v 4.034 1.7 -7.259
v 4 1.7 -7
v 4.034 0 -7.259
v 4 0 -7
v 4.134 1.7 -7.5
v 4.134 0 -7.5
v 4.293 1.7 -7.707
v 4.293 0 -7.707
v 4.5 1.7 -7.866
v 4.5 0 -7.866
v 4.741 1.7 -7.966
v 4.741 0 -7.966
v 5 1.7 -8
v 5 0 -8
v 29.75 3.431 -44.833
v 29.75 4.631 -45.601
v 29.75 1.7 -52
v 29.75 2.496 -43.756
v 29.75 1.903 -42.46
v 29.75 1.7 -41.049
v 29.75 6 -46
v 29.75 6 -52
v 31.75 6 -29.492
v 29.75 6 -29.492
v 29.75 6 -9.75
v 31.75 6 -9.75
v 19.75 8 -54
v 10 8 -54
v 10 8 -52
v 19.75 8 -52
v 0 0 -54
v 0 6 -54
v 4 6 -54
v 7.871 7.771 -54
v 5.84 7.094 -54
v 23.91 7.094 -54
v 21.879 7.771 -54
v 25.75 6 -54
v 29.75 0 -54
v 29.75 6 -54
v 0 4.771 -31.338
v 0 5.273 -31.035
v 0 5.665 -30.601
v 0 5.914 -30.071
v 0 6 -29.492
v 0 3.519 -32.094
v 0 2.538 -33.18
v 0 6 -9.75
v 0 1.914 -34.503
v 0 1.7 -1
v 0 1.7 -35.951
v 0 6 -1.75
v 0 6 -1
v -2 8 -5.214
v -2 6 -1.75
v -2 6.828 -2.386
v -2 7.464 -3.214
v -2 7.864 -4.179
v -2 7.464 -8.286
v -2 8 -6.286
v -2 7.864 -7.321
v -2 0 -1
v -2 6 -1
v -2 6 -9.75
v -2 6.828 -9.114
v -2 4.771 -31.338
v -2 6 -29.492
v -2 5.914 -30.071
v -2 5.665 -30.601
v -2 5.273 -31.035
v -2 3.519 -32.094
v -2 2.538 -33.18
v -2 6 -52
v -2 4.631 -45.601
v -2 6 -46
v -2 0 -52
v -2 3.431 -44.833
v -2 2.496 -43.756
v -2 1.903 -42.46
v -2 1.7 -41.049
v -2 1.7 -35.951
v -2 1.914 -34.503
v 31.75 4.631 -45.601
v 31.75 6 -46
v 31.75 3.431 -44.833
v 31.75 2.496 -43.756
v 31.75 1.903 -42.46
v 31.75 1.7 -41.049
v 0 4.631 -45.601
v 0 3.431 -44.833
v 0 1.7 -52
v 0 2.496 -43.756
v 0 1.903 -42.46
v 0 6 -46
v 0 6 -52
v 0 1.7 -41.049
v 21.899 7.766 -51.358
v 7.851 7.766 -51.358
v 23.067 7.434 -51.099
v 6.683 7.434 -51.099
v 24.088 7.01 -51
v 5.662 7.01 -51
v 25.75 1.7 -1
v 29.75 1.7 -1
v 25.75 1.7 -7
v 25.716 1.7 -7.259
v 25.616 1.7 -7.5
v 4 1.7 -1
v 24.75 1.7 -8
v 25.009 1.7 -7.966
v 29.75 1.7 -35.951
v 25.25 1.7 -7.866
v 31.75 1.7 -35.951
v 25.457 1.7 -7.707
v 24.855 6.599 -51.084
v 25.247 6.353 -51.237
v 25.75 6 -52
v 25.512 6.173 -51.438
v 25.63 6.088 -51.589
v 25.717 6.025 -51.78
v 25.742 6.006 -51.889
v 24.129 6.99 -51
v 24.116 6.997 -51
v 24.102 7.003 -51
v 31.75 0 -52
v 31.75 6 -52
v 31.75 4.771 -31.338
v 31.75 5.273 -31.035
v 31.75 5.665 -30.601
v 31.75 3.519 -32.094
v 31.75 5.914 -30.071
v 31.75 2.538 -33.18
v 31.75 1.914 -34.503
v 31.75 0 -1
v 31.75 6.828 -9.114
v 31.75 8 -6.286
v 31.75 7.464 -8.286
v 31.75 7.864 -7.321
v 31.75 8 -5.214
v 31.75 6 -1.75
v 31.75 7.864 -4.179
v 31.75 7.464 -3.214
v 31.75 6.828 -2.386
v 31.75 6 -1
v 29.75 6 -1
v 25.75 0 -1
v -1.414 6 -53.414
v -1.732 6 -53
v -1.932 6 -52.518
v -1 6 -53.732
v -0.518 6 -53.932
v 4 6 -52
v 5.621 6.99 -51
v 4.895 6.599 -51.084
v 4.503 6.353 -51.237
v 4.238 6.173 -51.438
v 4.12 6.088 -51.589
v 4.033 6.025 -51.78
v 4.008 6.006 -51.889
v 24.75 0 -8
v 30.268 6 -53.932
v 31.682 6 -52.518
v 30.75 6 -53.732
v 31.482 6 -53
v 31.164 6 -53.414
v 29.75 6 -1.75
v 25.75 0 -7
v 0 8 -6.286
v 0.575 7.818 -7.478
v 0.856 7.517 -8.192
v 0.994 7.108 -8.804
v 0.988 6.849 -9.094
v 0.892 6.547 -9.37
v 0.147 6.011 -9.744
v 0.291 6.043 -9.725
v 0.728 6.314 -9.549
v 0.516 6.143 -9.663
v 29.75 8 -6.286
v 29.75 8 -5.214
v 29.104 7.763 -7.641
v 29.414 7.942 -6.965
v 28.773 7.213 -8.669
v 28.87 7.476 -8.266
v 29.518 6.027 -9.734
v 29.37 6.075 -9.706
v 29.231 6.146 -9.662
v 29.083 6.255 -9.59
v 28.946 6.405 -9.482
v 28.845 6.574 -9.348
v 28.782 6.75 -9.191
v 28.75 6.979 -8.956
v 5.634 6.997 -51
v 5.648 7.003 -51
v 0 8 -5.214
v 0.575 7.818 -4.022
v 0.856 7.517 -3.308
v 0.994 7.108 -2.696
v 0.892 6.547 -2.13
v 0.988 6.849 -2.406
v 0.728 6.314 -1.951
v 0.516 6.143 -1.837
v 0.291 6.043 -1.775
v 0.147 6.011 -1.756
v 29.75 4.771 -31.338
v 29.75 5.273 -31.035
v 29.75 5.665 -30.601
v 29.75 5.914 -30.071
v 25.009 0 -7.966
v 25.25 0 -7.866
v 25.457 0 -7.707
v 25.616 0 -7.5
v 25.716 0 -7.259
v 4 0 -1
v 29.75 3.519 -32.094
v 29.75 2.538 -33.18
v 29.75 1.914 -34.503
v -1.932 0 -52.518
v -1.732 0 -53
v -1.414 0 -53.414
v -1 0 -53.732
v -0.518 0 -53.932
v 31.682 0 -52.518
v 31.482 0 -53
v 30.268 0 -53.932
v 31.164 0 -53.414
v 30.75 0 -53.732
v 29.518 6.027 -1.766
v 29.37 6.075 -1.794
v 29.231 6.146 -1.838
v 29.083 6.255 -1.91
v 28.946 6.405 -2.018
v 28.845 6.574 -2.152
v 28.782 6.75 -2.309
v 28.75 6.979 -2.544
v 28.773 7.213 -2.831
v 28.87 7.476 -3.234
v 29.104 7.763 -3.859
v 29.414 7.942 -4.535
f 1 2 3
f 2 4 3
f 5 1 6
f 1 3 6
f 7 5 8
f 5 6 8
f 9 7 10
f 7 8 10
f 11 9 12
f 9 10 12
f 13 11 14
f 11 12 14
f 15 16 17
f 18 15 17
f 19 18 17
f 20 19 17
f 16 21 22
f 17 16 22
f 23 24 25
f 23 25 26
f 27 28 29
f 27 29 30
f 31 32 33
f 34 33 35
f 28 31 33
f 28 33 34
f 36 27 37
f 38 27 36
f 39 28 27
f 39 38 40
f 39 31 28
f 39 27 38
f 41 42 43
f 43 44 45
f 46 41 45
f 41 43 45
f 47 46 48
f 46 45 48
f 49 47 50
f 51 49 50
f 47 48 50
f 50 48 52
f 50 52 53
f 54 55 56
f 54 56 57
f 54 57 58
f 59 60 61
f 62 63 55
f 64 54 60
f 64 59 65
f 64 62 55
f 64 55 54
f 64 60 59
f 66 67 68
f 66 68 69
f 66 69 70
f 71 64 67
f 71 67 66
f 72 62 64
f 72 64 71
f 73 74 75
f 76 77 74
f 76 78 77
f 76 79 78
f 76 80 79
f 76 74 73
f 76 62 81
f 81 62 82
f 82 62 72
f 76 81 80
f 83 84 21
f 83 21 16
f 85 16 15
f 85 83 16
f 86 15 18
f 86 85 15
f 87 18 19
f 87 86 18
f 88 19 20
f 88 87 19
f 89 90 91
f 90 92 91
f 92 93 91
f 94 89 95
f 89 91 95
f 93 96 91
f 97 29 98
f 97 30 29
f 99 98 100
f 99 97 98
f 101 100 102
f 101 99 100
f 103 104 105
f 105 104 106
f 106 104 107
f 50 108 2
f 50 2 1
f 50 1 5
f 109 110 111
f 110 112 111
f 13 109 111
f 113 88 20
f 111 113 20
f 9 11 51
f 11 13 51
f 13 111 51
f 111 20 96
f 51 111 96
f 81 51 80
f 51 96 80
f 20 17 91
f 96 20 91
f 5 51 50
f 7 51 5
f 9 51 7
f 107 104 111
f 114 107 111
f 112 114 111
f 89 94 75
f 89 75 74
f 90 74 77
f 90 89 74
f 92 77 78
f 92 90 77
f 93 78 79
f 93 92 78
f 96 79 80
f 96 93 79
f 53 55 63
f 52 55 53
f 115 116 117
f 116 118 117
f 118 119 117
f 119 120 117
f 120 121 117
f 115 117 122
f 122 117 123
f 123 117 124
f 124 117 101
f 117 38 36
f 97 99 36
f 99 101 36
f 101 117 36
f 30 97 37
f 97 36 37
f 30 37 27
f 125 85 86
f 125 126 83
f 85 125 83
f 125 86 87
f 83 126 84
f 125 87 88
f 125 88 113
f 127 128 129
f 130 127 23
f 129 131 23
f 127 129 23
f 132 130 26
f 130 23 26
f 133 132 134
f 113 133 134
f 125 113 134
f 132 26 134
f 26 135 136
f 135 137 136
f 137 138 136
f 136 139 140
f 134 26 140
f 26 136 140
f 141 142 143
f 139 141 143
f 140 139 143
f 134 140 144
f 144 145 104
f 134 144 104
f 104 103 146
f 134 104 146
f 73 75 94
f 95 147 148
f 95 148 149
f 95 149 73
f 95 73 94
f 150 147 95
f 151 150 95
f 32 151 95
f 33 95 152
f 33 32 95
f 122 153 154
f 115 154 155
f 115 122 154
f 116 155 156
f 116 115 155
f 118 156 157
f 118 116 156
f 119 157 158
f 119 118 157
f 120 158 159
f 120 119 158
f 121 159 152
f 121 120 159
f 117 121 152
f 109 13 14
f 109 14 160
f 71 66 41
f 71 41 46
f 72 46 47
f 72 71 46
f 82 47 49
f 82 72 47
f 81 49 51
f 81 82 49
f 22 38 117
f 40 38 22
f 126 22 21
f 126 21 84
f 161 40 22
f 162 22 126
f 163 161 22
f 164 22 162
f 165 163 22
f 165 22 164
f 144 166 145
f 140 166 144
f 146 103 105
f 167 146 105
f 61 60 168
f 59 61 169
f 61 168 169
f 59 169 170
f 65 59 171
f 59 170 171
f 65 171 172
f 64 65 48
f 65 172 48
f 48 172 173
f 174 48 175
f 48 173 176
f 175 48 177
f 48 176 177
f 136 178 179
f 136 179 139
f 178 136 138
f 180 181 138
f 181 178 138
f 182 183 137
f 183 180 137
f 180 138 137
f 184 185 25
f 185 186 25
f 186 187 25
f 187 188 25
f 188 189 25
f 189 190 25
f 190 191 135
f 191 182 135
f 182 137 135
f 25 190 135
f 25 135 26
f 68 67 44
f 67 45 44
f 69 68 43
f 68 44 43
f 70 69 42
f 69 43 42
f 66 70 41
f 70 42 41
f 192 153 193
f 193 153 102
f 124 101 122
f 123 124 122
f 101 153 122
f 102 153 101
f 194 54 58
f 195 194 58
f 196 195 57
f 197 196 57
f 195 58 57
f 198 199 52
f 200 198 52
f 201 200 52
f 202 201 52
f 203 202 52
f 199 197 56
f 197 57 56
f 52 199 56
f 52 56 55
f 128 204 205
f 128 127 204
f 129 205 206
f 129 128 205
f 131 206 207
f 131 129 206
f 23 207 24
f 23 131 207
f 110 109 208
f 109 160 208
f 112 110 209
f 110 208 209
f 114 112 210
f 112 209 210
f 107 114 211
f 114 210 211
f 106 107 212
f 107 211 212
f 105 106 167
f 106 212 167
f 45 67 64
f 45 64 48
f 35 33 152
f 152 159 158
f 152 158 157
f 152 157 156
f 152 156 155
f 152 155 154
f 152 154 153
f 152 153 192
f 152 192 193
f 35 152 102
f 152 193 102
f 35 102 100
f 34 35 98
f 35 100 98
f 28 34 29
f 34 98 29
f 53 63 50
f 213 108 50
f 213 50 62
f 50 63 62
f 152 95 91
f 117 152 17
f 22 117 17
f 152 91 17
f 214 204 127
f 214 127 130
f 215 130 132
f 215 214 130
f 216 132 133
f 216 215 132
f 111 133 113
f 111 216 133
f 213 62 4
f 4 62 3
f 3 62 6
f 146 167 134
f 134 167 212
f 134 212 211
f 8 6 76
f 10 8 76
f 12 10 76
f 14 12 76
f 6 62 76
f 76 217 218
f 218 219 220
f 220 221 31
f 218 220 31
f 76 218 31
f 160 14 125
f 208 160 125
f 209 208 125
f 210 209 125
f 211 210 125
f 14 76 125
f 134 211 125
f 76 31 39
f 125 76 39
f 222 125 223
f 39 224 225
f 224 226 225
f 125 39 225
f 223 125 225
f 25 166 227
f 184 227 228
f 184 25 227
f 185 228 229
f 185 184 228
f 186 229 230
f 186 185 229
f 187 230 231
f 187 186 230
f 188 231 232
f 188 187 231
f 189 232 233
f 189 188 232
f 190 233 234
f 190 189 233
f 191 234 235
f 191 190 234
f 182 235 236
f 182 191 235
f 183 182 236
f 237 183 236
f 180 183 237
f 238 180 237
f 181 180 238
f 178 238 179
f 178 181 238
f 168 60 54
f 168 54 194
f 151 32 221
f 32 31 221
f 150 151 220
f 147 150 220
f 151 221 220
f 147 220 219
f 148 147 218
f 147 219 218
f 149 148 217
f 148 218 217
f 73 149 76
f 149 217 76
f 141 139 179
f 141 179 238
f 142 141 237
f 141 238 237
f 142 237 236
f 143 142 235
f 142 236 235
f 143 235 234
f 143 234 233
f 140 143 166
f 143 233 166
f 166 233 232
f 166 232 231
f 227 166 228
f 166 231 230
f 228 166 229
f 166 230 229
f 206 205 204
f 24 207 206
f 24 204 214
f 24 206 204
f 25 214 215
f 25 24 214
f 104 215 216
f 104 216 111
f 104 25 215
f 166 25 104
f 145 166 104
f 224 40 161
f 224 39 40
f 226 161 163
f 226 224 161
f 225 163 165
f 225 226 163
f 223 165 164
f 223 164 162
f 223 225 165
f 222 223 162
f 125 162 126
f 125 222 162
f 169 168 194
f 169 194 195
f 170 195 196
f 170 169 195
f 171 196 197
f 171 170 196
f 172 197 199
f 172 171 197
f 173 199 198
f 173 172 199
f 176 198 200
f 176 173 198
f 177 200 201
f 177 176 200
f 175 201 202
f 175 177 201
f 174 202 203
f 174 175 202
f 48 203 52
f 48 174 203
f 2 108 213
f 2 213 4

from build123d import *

# Parameters (mm, degrees)
SKETCH1_W               = 33.75000000000001
SKETCH1_H               = 55.99999999999999
SKETCH1_W_2             = 29.750000000000004
SKETCH1_H_2             = 52.00000000000001
BOSS_EXTRUDE1_DEPTH     = 6
BOSS_EXTRUDE2_DEPTH     = 1.7
SKETCH3_W               = 29.750000000000004
SKETCH3_H               = 4.3
CUT_EXTRUDE1_DEPTH      = 63.92902748334825
SKETCH5_W               = 21.750000000000004
SKETCH5_H               = 2.999999999999986
SKETCH5_W_2             = 2.9999999999999996
SKETCH5_H_2             = 8
BOSS_EXTRUDE3_DEPTH     = 2
CUT_EXTRUDE2_DEPTH      = 62.66137364671663
CUT_EXTRUDE2_DEPTH_BACK = 62.66137364671663
CUT_EXTRUDE3_DEPTH      = 62.66137364671663
CUT_EXTRUDE3_DEPTH_BACK = 62.66137364671663
CUT_EXTRUDE4_START      = -21.75
CUT_EXTRUDE4_DEPTH      = 21.75
FILLET1_R               = 10
FILLET2_R               = 4
CUT_EXTRUDE5_DEPTH      = 65.17992314238798
SKETCH12_W              = 21.750000000000004
SKETCH12_H              = 6.999999999999999
CUT_EXTRUDE6_DEPTH      = 63.958339642557306
FILLET4_R               = 2
FILLET5_R               = 1
CUT_EXTRUDE7_DEPTH      = 64.15110873264877
CUT_EXTRUDE7_DEPTH_BACK = 64.15110873264877
SKETCH13_W              = 14.999999999999996
SKETCH13_H              = 4.300000000000001
FILLET6_R               = 5
FILLET7_R               = 2


# Read off the part's stored shape, not the designer's step: Cut-Extrude4
with BuildPart() as part:
    # Sketch1 → Boss-Extrude1 (new body)
    with BuildSketch(Plane(origin=(0, 0, 0), x_dir=(1, 0, 0), z_dir=(0, 1, 0))):
        with Locations((14.875000000000002, 25.999999999999996)):
            Rectangle(SKETCH1_W, SKETCH1_H)
        with Locations((14.875000000000002, 26.000000000000004)):
            Rectangle(SKETCH1_W_2, SKETCH1_H_2, mode=Mode.SUBTRACT)
    extrude(amount=BOSS_EXTRUDE1_DEPTH)

    # Sketch2 → Boss-Extrude2 (add)
    with BuildSketch(Plane.XZ):
        Polygon((-1.9999999999999996, 2), (31.749999999999993, 2), (31.75, -53.99999999999999), (-1.9999999999999927, -53.99999999999999), align=None)
    extrude(amount=-BOSS_EXTRUDE2_DEPTH)

    # Sketch3 → Cut-Extrude1 (cut, through all)
    with BuildSketch(Plane(origin=(0, 0, 0), x_dir=(-1, 0, 0), z_dir=(0, 0, -1))):
        with Locations((-14.875000000000002, 3.85)):
            Rectangle(SKETCH3_W, SKETCH3_H)
    extrude(amount=-CUT_EXTRUDE1_DEPTH, mode=Mode.SUBTRACT)

    # Sketch5 → Boss-Extrude3 (add)
    with BuildSketch(Plane(origin=(0, 6, 0), x_dir=(1, 0, 0), z_dir=(0, 1, 0))):
        with Locations((14.875000000000002, 52.5)):
            Rectangle(SKETCH5_W, SKETCH5_H)
        with Locations((-0.4999999999999998, 5.75)):
            Rectangle(SKETCH5_W_2, SKETCH5_H_2)
        Polygon((31.750000000000014, 9.750000000000004), (28.75000000000001, 9.750000000000004), (28.750000000000014, 1.7500000000000033), (31.75000000000002, 1.750000000000004), align=None)
    extrude(amount=BOSS_EXTRUDE3_DEPTH)

    # Sketch6 → Cut-Extrude2 (cut, two sides: drawn at the far end of the back side and taken through both)
    with BuildSketch(Plane.XY.offset(-1.7499999999999998).offset(-CUT_EXTRUDE2_DEPTH_BACK)):
        with BuildLine():
            Line((1, 8), (0, 8))
            ThreePointArc((0, 8), (0.7071067811865474, 7.707106781186548), (1.0000000000000002, 7.000000000000001))
            Line((1, 7.000000000000001), (1, 8))
        make_face()
        with BuildLine():
            Line((1, 6), (1, 7.000000000000001))
            ThreePointArc((1.0000000000000002, 7.000000000000001), (0.7071067811865479, 6.292893218813453), (1.2e-16, 6))
            Line((0, 6), (1, 6))
        make_face()
    extrude(amount=CUT_EXTRUDE2_DEPTH + CUT_EXTRUDE2_DEPTH_BACK, mode=Mode.SUBTRACT)

    # Sketch7 → Cut-Extrude3 (cut, two sides: drawn at the far end of the back side and taken through both)
    with BuildSketch(Plane.XY.offset(-1.749999999999997).offset(-CUT_EXTRUDE3_DEPTH_BACK)):
        with BuildLine():
            Line((28.750000000000014, 6), (29.75, 6))
            ThreePointArc((29.75, 6), (29.042893218813454, 6.292893218813452), (28.75, 7))
            Line((28.750000000000014, 7), (28.750000000000014, 6))
        make_face()
        with BuildLine():
            Line((28.750000000000014, 8), (28.750000000000014, 7))
            ThreePointArc((28.75, 7), (29.042893218813454, 7.707106781186548), (29.75, 8))
            Line((29.75, 8), (28.750000000000014, 8))
        make_face()
    extrude(amount=CUT_EXTRUDE3_DEPTH + CUT_EXTRUDE3_DEPTH_BACK, mode=Mode.SUBTRACT)

    # Cut-Extrude4 outline → Cut-Extrude4 (cut)
    with BuildSketch(Plane.ZY.offset(-4).offset(CUT_EXTRUDE4_START)):
        with BuildLine():
            Line((-51, 6), (-51, 6.99))
            ThreePointArc((-51, 6.99), (-51.296387635, 6.289366479), (-51.99995, 5.999999999))
            Line((-51.99995, 5.999999999), (-51, 6))
        make_face()
        with BuildLine():
            ThreePointArc((-51.99995, 8.000000001), (-51.296387635, 7.710633521), (-51, 7.01))
            Line((-51, 7.01), (-51, 8))
            Line((-51, 8), (-51.99995, 8.000000001))
        make_face()
    extrude(amount=CUT_EXTRUDE4_DEPTH, mode=Mode.SUBTRACT)

    # Fillet1
    # the kernel refuses this fillet: 10 mm, written as the material it takes off along each edge
    with BuildSketch(Plane(origin=(4, 8, -36.99994999999842), x_dir=(1.1324e-13, -1, 0), z_dir=(0, 0, -1))) as fillet1_piece_1:
        with BuildLine():
            CenterArc((10.000000000000679, -5.999999999999498), FILLET1_R, 143.13010235415956, 36.86989764584689)
            Line((6.7946e-13, -6.000000000000631), (-0.19999999999931983, -6.000000000000653))
            Line((-0.19999999999931983, -6.000000000000653), (-0.1999999999999993, -2.265e-14))
            Line((-0.1999999999999993, -2.265e-14), (-2.265e-14, 0.20000000000000018))
            ThreePointArc((-2.265e-14, 0.20000000000000018), (1.0000000000001283, 0.20000000000011342), (1.8400000000002954, 0.11999999999998998))
            Line((1.8400000000002954, 0.11999999999998998), (2.000000000000303, 0))
        make_face()
    extrude(amount=32.00005000000314, mode=Mode.SUBTRACT)
    with BuildSketch(Plane(origin=(25.750000000000004, 8, -69.00000000000158), x_dir=(-1, 0, 0), z_dir=(0, 0, 1))) as fillet1_piece_2:
        with BuildLine():
            CenterArc((6.000000000000632, 10), FILLET1_R, 233.13010235415308, 36.86989764584689)
            Line((2.2737e-13, 2.0000000000003038), (-0.11999999999978073, 1.8400000000003098))
            ThreePointArc((-0.11999999999978073, 1.8400000000003098), (-0.1999999999999993, 1.0000000000001519), (-0.1999999999999993, 0))
            Line((-0.1999999999999993, 0), (0, -0.1999999999999993))
            Line((0, -0.1999999999999993), (6.000000000000632, -0.1999999999999993))
            Line((6.000000000000632, -0.1999999999999993), (6.000000000000632, 0))
        make_face()
    extrude(amount=32.00005000000316, mode=Mode.SUBTRACT)

    # Fillet2
    # the kernel refuses this fillet: 4 mm, written as the material it takes off along each edge
    with BuildSketch(Plane(origin=(8.66025403784487, 8, -9.75), x_dir=(0, -1, 7.283e-14), z_dir=(-1, 0, 0))) as fillet2_piece_1:
        with BuildLine():
            CenterArc((4.000000000000252, 3.4641016151376567), FILLET2_R, 179.99999999999582, 60.000000000001364)
            Line((2.5229e-13, 3.464101615137948), (-0.07999999999974777, 3.464101615137954))
            Line((-0.07999999999974777, 3.464101615137954), (-0.08000000000000007, 5.83e-15))
            Line((-0.08000000000000007, 5.83e-15), (-5.83e-15, -0.08000000000000007))
            ThreePointArc((-5.83e-15, -0.08000000000000007), (1.000000000000036, -0.0800000000000729), (1.9600000000000801, -0.06928203230275251))
            Line((1.9600000000000801, -0.06928203230275251), (2.0000000000000835, 0))
        make_face()
    extrude(amount=19.32050807568974, mode=Mode.SUBTRACT)
    with BuildSketch(Plane(origin=(-10.66025403784487, 8, -1.7499999999999998), x_dir=(0, -1, -7.25e-14), z_dir=(1, 0, 0))) as fillet2_piece_2:
        with BuildLine():
            CenterArc((4.000000000000251, 3.464101615137658), FILLET2_R, 179.99999999999585, 60.000000000001364)
            Line((2.5114e-13, 3.464101615137948), (-0.07999999999974894, 3.464101615137954))
            Line((-0.07999999999974894, 3.464101615137954), (-0.08000000000000007, 5.8e-15))
            Line((-0.08000000000000007, 5.8e-15), (-5.8e-15, -0.08000000000000007))
            ThreePointArc((-5.8e-15, -0.08000000000000007), (1.000000000000036, -0.08000000000007257), (1.9600000000000801, -0.06928203230275319))
            Line((1.9600000000000801, -0.06928203230275319), (2.0000000000000835, 0))
        make_face()
    extrude(amount=19.32050807568974, mode=Mode.SUBTRACT)
    with BuildSketch(Plane(origin=(40.41025403784491, 8, -9.750000000000004), x_dir=(0, -1, 7.55e-14), z_dir=(-1, 0, 0))) as fillet2_piece_3:
        with BuildLine():
            CenterArc((4.000000000000261, 3.464101615137654), FILLET2_R, 179.99999999999568, 60.00000000000142)
            Line((2.6152e-13, 3.464101615137956), (-0.07999999999973854, 3.464101615137962))
            Line((-0.07999999999973854, 3.464101615137962), (-0.08000000000000007, 6.04e-15))
            Line((-0.08000000000000007, 6.04e-15), (-6.04e-15, -0.08000000000000007))
            ThreePointArc((-6.04e-15, -0.08000000000000007), (1.0000000000000375, -0.08000000000007557), (1.9600000000000835, -0.0692820323027524))
            Line((1.9600000000000835, -0.0692820323027524), (2.000000000000087, 0))
        make_face()
    extrude(amount=19.320508075689798, mode=Mode.SUBTRACT)
    with BuildSketch(Plane(origin=(21.08974596215511, 8, -1.7500000000000018), x_dir=(-2.2e-16, 0, -1), z_dir=(1, 0, -2.2e-16))) as fillet2_piece_4:
        with BuildLine():
            CenterArc((3.464101615137956, -4), FILLET2_R, 90, 60.00000000000145)
            Line((1.5055e-13, -2.000000000000087), (-0.06928203230260555, -1.9600000000000888))
            ThreePointArc((-0.06928203230260555, -1.9600000000000888), (-0.0800000000000003, -1.0000000000000435), (-0.08000000000000007, 0))
            Line((-0.08000000000000007, 0), (0, 0.08000000000000007))
            Line((0, 0.08000000000000007), (3.464101615137956, 0.08000000000000007))
            Line((3.464101615137956, 0.08000000000000007), (3.464101615137956, 0))
        make_face()
    extrude(amount=19.320508075689798, mode=Mode.SUBTRACT)

    # Sketch11 → Cut-Extrude5 (cut, through all)
    with BuildSketch(Plane.ZY.offset(2.000000000000001)):
        Polygon((2, 6), (-1, 6), (-1.0000000000000009, 0), (2, 0), align=None)
    extrude(amount=-CUT_EXTRUDE5_DEPTH, mode=Mode.SUBTRACT)

    # Sketch12 → Cut-Extrude6 (cut, through all)
    with BuildSketch(Plane(origin=(0, 1.7, 0), x_dir=(1, 0, 0), z_dir=(0, 1, 0))):
        with Locations((14.875000000000002, 4.5)):
            Rectangle(SKETCH12_W, SKETCH12_H)
    extrude(amount=-CUT_EXTRUDE6_DEPTH, mode=Mode.SUBTRACT)

    # Fillet4
    fillet4_edges = [part.edges().sort_by_distance(p)[0] for p in [
        (-1.9999999999999987, 3, -53.99999999999999),
        (31.75, 3, -53.99999999999999),
    ]]
    fillet(fillet4_edges, radius=FILLET4_R)

    # Fillet5
    fillet5_edges = [part.edges().sort_by_distance(p)[0] for p in [
        (4, 0.85, -8),
        (25.75, 0.85, -8),
    ]]
    fillet(fillet5_edges, radius=FILLET5_R)

    # Sketch13 → Cut-Extrude7 (cut, two sides: drawn at the far end of the back side and taken through both)
    with BuildSketch(Plane(origin=(0, 0, 0), x_dir=(0, 0, -1), z_dir=(1, 0, 0)).offset(-CUT_EXTRUDE7_DEPTH_BACK)):
        with Locations((38.5, 3.8499999999999996)):
            Rectangle(SKETCH13_W, SKETCH13_H)
    extrude(amount=CUT_EXTRUDE7_DEPTH + CUT_EXTRUDE7_DEPTH_BACK, mode=Mode.SUBTRACT)

    # Fillet6
    # the kernel refuses this fillet: 5 mm, written as the material it adds along each edge
    with BuildSketch(Plane(origin=(31.75, 1.7, -46), x_dir=(0, 4e-17, 1), z_dir=(-1, 0, 0)), Plane(origin=(0, 1.7, -46), x_dir=(0, 4e-17, 1), z_dir=(-1, 0, 0))) as fillet6_piece_1:
        with BuildLine():
            CenterArc((4.9507575177946705, 5), FILLET6_R, 188.04784624731144, 81.95215375268856)
            Line((4.283e-14, 4.300000000000006), (-0.09901515035584632, 4.286000000000006))
            ThreePointArc((-0.09901515035584632, 4.286000000000006), (-0.10000000000000132, 2.150000000000003), (-0.10000000000000142, 0))
            Line((-0.10000000000000142, 0), (0, -0.10000000000000009))
            Line((0, -0.10000000000000009), (4.9507575177946705, -0.10000000000000009))
            Line((4.9507575177946705, -0.10000000000000009), (4.9507575177946705, 0))
        make_face()
    extrude(amount=2)
    with BuildSketch(Plane(origin=(29.75, 1.7, -31), x_dir=(0, 4e-17, -1), z_dir=(1, 0, 0)), Plane(origin=(-2, 1.7, -31), x_dir=(0, 4e-17, -1), z_dir=(1, 0, 0))) as fillet6_piece_2:
        with BuildLine():
            CenterArc((4.9507575177946705, 5), FILLET6_R, 188.04784624731144, 81.95215375268856)
            Line((4.283e-14, 4.300000000000006), (-0.09901515035584987, 4.286000000000006))
            ThreePointArc((-0.09901515035584987, 4.286000000000006), (-0.10000000000000132, 2.150000000000003), (-0.10000000000000142, 0))
            Line((-0.10000000000000142, 0), (0, -0.10000000000000009))
            Line((0, -0.10000000000000009), (4.9507575177946705, -0.10000000000000009))
            Line((4.9507575177946705, -0.10000000000000009), (4.9507575177946705, 0))
        make_face()
    extrude(amount=2)

    # Fillet7
    fillet7_edges = [part.edges().sort_by_distance(p)[0] for p in [
        (-1, 6, -31),
        (30.75, 6, -31),
    ]]
    fillet(fillet7_edges, radius=FILLET7_R)


solid = part.part
